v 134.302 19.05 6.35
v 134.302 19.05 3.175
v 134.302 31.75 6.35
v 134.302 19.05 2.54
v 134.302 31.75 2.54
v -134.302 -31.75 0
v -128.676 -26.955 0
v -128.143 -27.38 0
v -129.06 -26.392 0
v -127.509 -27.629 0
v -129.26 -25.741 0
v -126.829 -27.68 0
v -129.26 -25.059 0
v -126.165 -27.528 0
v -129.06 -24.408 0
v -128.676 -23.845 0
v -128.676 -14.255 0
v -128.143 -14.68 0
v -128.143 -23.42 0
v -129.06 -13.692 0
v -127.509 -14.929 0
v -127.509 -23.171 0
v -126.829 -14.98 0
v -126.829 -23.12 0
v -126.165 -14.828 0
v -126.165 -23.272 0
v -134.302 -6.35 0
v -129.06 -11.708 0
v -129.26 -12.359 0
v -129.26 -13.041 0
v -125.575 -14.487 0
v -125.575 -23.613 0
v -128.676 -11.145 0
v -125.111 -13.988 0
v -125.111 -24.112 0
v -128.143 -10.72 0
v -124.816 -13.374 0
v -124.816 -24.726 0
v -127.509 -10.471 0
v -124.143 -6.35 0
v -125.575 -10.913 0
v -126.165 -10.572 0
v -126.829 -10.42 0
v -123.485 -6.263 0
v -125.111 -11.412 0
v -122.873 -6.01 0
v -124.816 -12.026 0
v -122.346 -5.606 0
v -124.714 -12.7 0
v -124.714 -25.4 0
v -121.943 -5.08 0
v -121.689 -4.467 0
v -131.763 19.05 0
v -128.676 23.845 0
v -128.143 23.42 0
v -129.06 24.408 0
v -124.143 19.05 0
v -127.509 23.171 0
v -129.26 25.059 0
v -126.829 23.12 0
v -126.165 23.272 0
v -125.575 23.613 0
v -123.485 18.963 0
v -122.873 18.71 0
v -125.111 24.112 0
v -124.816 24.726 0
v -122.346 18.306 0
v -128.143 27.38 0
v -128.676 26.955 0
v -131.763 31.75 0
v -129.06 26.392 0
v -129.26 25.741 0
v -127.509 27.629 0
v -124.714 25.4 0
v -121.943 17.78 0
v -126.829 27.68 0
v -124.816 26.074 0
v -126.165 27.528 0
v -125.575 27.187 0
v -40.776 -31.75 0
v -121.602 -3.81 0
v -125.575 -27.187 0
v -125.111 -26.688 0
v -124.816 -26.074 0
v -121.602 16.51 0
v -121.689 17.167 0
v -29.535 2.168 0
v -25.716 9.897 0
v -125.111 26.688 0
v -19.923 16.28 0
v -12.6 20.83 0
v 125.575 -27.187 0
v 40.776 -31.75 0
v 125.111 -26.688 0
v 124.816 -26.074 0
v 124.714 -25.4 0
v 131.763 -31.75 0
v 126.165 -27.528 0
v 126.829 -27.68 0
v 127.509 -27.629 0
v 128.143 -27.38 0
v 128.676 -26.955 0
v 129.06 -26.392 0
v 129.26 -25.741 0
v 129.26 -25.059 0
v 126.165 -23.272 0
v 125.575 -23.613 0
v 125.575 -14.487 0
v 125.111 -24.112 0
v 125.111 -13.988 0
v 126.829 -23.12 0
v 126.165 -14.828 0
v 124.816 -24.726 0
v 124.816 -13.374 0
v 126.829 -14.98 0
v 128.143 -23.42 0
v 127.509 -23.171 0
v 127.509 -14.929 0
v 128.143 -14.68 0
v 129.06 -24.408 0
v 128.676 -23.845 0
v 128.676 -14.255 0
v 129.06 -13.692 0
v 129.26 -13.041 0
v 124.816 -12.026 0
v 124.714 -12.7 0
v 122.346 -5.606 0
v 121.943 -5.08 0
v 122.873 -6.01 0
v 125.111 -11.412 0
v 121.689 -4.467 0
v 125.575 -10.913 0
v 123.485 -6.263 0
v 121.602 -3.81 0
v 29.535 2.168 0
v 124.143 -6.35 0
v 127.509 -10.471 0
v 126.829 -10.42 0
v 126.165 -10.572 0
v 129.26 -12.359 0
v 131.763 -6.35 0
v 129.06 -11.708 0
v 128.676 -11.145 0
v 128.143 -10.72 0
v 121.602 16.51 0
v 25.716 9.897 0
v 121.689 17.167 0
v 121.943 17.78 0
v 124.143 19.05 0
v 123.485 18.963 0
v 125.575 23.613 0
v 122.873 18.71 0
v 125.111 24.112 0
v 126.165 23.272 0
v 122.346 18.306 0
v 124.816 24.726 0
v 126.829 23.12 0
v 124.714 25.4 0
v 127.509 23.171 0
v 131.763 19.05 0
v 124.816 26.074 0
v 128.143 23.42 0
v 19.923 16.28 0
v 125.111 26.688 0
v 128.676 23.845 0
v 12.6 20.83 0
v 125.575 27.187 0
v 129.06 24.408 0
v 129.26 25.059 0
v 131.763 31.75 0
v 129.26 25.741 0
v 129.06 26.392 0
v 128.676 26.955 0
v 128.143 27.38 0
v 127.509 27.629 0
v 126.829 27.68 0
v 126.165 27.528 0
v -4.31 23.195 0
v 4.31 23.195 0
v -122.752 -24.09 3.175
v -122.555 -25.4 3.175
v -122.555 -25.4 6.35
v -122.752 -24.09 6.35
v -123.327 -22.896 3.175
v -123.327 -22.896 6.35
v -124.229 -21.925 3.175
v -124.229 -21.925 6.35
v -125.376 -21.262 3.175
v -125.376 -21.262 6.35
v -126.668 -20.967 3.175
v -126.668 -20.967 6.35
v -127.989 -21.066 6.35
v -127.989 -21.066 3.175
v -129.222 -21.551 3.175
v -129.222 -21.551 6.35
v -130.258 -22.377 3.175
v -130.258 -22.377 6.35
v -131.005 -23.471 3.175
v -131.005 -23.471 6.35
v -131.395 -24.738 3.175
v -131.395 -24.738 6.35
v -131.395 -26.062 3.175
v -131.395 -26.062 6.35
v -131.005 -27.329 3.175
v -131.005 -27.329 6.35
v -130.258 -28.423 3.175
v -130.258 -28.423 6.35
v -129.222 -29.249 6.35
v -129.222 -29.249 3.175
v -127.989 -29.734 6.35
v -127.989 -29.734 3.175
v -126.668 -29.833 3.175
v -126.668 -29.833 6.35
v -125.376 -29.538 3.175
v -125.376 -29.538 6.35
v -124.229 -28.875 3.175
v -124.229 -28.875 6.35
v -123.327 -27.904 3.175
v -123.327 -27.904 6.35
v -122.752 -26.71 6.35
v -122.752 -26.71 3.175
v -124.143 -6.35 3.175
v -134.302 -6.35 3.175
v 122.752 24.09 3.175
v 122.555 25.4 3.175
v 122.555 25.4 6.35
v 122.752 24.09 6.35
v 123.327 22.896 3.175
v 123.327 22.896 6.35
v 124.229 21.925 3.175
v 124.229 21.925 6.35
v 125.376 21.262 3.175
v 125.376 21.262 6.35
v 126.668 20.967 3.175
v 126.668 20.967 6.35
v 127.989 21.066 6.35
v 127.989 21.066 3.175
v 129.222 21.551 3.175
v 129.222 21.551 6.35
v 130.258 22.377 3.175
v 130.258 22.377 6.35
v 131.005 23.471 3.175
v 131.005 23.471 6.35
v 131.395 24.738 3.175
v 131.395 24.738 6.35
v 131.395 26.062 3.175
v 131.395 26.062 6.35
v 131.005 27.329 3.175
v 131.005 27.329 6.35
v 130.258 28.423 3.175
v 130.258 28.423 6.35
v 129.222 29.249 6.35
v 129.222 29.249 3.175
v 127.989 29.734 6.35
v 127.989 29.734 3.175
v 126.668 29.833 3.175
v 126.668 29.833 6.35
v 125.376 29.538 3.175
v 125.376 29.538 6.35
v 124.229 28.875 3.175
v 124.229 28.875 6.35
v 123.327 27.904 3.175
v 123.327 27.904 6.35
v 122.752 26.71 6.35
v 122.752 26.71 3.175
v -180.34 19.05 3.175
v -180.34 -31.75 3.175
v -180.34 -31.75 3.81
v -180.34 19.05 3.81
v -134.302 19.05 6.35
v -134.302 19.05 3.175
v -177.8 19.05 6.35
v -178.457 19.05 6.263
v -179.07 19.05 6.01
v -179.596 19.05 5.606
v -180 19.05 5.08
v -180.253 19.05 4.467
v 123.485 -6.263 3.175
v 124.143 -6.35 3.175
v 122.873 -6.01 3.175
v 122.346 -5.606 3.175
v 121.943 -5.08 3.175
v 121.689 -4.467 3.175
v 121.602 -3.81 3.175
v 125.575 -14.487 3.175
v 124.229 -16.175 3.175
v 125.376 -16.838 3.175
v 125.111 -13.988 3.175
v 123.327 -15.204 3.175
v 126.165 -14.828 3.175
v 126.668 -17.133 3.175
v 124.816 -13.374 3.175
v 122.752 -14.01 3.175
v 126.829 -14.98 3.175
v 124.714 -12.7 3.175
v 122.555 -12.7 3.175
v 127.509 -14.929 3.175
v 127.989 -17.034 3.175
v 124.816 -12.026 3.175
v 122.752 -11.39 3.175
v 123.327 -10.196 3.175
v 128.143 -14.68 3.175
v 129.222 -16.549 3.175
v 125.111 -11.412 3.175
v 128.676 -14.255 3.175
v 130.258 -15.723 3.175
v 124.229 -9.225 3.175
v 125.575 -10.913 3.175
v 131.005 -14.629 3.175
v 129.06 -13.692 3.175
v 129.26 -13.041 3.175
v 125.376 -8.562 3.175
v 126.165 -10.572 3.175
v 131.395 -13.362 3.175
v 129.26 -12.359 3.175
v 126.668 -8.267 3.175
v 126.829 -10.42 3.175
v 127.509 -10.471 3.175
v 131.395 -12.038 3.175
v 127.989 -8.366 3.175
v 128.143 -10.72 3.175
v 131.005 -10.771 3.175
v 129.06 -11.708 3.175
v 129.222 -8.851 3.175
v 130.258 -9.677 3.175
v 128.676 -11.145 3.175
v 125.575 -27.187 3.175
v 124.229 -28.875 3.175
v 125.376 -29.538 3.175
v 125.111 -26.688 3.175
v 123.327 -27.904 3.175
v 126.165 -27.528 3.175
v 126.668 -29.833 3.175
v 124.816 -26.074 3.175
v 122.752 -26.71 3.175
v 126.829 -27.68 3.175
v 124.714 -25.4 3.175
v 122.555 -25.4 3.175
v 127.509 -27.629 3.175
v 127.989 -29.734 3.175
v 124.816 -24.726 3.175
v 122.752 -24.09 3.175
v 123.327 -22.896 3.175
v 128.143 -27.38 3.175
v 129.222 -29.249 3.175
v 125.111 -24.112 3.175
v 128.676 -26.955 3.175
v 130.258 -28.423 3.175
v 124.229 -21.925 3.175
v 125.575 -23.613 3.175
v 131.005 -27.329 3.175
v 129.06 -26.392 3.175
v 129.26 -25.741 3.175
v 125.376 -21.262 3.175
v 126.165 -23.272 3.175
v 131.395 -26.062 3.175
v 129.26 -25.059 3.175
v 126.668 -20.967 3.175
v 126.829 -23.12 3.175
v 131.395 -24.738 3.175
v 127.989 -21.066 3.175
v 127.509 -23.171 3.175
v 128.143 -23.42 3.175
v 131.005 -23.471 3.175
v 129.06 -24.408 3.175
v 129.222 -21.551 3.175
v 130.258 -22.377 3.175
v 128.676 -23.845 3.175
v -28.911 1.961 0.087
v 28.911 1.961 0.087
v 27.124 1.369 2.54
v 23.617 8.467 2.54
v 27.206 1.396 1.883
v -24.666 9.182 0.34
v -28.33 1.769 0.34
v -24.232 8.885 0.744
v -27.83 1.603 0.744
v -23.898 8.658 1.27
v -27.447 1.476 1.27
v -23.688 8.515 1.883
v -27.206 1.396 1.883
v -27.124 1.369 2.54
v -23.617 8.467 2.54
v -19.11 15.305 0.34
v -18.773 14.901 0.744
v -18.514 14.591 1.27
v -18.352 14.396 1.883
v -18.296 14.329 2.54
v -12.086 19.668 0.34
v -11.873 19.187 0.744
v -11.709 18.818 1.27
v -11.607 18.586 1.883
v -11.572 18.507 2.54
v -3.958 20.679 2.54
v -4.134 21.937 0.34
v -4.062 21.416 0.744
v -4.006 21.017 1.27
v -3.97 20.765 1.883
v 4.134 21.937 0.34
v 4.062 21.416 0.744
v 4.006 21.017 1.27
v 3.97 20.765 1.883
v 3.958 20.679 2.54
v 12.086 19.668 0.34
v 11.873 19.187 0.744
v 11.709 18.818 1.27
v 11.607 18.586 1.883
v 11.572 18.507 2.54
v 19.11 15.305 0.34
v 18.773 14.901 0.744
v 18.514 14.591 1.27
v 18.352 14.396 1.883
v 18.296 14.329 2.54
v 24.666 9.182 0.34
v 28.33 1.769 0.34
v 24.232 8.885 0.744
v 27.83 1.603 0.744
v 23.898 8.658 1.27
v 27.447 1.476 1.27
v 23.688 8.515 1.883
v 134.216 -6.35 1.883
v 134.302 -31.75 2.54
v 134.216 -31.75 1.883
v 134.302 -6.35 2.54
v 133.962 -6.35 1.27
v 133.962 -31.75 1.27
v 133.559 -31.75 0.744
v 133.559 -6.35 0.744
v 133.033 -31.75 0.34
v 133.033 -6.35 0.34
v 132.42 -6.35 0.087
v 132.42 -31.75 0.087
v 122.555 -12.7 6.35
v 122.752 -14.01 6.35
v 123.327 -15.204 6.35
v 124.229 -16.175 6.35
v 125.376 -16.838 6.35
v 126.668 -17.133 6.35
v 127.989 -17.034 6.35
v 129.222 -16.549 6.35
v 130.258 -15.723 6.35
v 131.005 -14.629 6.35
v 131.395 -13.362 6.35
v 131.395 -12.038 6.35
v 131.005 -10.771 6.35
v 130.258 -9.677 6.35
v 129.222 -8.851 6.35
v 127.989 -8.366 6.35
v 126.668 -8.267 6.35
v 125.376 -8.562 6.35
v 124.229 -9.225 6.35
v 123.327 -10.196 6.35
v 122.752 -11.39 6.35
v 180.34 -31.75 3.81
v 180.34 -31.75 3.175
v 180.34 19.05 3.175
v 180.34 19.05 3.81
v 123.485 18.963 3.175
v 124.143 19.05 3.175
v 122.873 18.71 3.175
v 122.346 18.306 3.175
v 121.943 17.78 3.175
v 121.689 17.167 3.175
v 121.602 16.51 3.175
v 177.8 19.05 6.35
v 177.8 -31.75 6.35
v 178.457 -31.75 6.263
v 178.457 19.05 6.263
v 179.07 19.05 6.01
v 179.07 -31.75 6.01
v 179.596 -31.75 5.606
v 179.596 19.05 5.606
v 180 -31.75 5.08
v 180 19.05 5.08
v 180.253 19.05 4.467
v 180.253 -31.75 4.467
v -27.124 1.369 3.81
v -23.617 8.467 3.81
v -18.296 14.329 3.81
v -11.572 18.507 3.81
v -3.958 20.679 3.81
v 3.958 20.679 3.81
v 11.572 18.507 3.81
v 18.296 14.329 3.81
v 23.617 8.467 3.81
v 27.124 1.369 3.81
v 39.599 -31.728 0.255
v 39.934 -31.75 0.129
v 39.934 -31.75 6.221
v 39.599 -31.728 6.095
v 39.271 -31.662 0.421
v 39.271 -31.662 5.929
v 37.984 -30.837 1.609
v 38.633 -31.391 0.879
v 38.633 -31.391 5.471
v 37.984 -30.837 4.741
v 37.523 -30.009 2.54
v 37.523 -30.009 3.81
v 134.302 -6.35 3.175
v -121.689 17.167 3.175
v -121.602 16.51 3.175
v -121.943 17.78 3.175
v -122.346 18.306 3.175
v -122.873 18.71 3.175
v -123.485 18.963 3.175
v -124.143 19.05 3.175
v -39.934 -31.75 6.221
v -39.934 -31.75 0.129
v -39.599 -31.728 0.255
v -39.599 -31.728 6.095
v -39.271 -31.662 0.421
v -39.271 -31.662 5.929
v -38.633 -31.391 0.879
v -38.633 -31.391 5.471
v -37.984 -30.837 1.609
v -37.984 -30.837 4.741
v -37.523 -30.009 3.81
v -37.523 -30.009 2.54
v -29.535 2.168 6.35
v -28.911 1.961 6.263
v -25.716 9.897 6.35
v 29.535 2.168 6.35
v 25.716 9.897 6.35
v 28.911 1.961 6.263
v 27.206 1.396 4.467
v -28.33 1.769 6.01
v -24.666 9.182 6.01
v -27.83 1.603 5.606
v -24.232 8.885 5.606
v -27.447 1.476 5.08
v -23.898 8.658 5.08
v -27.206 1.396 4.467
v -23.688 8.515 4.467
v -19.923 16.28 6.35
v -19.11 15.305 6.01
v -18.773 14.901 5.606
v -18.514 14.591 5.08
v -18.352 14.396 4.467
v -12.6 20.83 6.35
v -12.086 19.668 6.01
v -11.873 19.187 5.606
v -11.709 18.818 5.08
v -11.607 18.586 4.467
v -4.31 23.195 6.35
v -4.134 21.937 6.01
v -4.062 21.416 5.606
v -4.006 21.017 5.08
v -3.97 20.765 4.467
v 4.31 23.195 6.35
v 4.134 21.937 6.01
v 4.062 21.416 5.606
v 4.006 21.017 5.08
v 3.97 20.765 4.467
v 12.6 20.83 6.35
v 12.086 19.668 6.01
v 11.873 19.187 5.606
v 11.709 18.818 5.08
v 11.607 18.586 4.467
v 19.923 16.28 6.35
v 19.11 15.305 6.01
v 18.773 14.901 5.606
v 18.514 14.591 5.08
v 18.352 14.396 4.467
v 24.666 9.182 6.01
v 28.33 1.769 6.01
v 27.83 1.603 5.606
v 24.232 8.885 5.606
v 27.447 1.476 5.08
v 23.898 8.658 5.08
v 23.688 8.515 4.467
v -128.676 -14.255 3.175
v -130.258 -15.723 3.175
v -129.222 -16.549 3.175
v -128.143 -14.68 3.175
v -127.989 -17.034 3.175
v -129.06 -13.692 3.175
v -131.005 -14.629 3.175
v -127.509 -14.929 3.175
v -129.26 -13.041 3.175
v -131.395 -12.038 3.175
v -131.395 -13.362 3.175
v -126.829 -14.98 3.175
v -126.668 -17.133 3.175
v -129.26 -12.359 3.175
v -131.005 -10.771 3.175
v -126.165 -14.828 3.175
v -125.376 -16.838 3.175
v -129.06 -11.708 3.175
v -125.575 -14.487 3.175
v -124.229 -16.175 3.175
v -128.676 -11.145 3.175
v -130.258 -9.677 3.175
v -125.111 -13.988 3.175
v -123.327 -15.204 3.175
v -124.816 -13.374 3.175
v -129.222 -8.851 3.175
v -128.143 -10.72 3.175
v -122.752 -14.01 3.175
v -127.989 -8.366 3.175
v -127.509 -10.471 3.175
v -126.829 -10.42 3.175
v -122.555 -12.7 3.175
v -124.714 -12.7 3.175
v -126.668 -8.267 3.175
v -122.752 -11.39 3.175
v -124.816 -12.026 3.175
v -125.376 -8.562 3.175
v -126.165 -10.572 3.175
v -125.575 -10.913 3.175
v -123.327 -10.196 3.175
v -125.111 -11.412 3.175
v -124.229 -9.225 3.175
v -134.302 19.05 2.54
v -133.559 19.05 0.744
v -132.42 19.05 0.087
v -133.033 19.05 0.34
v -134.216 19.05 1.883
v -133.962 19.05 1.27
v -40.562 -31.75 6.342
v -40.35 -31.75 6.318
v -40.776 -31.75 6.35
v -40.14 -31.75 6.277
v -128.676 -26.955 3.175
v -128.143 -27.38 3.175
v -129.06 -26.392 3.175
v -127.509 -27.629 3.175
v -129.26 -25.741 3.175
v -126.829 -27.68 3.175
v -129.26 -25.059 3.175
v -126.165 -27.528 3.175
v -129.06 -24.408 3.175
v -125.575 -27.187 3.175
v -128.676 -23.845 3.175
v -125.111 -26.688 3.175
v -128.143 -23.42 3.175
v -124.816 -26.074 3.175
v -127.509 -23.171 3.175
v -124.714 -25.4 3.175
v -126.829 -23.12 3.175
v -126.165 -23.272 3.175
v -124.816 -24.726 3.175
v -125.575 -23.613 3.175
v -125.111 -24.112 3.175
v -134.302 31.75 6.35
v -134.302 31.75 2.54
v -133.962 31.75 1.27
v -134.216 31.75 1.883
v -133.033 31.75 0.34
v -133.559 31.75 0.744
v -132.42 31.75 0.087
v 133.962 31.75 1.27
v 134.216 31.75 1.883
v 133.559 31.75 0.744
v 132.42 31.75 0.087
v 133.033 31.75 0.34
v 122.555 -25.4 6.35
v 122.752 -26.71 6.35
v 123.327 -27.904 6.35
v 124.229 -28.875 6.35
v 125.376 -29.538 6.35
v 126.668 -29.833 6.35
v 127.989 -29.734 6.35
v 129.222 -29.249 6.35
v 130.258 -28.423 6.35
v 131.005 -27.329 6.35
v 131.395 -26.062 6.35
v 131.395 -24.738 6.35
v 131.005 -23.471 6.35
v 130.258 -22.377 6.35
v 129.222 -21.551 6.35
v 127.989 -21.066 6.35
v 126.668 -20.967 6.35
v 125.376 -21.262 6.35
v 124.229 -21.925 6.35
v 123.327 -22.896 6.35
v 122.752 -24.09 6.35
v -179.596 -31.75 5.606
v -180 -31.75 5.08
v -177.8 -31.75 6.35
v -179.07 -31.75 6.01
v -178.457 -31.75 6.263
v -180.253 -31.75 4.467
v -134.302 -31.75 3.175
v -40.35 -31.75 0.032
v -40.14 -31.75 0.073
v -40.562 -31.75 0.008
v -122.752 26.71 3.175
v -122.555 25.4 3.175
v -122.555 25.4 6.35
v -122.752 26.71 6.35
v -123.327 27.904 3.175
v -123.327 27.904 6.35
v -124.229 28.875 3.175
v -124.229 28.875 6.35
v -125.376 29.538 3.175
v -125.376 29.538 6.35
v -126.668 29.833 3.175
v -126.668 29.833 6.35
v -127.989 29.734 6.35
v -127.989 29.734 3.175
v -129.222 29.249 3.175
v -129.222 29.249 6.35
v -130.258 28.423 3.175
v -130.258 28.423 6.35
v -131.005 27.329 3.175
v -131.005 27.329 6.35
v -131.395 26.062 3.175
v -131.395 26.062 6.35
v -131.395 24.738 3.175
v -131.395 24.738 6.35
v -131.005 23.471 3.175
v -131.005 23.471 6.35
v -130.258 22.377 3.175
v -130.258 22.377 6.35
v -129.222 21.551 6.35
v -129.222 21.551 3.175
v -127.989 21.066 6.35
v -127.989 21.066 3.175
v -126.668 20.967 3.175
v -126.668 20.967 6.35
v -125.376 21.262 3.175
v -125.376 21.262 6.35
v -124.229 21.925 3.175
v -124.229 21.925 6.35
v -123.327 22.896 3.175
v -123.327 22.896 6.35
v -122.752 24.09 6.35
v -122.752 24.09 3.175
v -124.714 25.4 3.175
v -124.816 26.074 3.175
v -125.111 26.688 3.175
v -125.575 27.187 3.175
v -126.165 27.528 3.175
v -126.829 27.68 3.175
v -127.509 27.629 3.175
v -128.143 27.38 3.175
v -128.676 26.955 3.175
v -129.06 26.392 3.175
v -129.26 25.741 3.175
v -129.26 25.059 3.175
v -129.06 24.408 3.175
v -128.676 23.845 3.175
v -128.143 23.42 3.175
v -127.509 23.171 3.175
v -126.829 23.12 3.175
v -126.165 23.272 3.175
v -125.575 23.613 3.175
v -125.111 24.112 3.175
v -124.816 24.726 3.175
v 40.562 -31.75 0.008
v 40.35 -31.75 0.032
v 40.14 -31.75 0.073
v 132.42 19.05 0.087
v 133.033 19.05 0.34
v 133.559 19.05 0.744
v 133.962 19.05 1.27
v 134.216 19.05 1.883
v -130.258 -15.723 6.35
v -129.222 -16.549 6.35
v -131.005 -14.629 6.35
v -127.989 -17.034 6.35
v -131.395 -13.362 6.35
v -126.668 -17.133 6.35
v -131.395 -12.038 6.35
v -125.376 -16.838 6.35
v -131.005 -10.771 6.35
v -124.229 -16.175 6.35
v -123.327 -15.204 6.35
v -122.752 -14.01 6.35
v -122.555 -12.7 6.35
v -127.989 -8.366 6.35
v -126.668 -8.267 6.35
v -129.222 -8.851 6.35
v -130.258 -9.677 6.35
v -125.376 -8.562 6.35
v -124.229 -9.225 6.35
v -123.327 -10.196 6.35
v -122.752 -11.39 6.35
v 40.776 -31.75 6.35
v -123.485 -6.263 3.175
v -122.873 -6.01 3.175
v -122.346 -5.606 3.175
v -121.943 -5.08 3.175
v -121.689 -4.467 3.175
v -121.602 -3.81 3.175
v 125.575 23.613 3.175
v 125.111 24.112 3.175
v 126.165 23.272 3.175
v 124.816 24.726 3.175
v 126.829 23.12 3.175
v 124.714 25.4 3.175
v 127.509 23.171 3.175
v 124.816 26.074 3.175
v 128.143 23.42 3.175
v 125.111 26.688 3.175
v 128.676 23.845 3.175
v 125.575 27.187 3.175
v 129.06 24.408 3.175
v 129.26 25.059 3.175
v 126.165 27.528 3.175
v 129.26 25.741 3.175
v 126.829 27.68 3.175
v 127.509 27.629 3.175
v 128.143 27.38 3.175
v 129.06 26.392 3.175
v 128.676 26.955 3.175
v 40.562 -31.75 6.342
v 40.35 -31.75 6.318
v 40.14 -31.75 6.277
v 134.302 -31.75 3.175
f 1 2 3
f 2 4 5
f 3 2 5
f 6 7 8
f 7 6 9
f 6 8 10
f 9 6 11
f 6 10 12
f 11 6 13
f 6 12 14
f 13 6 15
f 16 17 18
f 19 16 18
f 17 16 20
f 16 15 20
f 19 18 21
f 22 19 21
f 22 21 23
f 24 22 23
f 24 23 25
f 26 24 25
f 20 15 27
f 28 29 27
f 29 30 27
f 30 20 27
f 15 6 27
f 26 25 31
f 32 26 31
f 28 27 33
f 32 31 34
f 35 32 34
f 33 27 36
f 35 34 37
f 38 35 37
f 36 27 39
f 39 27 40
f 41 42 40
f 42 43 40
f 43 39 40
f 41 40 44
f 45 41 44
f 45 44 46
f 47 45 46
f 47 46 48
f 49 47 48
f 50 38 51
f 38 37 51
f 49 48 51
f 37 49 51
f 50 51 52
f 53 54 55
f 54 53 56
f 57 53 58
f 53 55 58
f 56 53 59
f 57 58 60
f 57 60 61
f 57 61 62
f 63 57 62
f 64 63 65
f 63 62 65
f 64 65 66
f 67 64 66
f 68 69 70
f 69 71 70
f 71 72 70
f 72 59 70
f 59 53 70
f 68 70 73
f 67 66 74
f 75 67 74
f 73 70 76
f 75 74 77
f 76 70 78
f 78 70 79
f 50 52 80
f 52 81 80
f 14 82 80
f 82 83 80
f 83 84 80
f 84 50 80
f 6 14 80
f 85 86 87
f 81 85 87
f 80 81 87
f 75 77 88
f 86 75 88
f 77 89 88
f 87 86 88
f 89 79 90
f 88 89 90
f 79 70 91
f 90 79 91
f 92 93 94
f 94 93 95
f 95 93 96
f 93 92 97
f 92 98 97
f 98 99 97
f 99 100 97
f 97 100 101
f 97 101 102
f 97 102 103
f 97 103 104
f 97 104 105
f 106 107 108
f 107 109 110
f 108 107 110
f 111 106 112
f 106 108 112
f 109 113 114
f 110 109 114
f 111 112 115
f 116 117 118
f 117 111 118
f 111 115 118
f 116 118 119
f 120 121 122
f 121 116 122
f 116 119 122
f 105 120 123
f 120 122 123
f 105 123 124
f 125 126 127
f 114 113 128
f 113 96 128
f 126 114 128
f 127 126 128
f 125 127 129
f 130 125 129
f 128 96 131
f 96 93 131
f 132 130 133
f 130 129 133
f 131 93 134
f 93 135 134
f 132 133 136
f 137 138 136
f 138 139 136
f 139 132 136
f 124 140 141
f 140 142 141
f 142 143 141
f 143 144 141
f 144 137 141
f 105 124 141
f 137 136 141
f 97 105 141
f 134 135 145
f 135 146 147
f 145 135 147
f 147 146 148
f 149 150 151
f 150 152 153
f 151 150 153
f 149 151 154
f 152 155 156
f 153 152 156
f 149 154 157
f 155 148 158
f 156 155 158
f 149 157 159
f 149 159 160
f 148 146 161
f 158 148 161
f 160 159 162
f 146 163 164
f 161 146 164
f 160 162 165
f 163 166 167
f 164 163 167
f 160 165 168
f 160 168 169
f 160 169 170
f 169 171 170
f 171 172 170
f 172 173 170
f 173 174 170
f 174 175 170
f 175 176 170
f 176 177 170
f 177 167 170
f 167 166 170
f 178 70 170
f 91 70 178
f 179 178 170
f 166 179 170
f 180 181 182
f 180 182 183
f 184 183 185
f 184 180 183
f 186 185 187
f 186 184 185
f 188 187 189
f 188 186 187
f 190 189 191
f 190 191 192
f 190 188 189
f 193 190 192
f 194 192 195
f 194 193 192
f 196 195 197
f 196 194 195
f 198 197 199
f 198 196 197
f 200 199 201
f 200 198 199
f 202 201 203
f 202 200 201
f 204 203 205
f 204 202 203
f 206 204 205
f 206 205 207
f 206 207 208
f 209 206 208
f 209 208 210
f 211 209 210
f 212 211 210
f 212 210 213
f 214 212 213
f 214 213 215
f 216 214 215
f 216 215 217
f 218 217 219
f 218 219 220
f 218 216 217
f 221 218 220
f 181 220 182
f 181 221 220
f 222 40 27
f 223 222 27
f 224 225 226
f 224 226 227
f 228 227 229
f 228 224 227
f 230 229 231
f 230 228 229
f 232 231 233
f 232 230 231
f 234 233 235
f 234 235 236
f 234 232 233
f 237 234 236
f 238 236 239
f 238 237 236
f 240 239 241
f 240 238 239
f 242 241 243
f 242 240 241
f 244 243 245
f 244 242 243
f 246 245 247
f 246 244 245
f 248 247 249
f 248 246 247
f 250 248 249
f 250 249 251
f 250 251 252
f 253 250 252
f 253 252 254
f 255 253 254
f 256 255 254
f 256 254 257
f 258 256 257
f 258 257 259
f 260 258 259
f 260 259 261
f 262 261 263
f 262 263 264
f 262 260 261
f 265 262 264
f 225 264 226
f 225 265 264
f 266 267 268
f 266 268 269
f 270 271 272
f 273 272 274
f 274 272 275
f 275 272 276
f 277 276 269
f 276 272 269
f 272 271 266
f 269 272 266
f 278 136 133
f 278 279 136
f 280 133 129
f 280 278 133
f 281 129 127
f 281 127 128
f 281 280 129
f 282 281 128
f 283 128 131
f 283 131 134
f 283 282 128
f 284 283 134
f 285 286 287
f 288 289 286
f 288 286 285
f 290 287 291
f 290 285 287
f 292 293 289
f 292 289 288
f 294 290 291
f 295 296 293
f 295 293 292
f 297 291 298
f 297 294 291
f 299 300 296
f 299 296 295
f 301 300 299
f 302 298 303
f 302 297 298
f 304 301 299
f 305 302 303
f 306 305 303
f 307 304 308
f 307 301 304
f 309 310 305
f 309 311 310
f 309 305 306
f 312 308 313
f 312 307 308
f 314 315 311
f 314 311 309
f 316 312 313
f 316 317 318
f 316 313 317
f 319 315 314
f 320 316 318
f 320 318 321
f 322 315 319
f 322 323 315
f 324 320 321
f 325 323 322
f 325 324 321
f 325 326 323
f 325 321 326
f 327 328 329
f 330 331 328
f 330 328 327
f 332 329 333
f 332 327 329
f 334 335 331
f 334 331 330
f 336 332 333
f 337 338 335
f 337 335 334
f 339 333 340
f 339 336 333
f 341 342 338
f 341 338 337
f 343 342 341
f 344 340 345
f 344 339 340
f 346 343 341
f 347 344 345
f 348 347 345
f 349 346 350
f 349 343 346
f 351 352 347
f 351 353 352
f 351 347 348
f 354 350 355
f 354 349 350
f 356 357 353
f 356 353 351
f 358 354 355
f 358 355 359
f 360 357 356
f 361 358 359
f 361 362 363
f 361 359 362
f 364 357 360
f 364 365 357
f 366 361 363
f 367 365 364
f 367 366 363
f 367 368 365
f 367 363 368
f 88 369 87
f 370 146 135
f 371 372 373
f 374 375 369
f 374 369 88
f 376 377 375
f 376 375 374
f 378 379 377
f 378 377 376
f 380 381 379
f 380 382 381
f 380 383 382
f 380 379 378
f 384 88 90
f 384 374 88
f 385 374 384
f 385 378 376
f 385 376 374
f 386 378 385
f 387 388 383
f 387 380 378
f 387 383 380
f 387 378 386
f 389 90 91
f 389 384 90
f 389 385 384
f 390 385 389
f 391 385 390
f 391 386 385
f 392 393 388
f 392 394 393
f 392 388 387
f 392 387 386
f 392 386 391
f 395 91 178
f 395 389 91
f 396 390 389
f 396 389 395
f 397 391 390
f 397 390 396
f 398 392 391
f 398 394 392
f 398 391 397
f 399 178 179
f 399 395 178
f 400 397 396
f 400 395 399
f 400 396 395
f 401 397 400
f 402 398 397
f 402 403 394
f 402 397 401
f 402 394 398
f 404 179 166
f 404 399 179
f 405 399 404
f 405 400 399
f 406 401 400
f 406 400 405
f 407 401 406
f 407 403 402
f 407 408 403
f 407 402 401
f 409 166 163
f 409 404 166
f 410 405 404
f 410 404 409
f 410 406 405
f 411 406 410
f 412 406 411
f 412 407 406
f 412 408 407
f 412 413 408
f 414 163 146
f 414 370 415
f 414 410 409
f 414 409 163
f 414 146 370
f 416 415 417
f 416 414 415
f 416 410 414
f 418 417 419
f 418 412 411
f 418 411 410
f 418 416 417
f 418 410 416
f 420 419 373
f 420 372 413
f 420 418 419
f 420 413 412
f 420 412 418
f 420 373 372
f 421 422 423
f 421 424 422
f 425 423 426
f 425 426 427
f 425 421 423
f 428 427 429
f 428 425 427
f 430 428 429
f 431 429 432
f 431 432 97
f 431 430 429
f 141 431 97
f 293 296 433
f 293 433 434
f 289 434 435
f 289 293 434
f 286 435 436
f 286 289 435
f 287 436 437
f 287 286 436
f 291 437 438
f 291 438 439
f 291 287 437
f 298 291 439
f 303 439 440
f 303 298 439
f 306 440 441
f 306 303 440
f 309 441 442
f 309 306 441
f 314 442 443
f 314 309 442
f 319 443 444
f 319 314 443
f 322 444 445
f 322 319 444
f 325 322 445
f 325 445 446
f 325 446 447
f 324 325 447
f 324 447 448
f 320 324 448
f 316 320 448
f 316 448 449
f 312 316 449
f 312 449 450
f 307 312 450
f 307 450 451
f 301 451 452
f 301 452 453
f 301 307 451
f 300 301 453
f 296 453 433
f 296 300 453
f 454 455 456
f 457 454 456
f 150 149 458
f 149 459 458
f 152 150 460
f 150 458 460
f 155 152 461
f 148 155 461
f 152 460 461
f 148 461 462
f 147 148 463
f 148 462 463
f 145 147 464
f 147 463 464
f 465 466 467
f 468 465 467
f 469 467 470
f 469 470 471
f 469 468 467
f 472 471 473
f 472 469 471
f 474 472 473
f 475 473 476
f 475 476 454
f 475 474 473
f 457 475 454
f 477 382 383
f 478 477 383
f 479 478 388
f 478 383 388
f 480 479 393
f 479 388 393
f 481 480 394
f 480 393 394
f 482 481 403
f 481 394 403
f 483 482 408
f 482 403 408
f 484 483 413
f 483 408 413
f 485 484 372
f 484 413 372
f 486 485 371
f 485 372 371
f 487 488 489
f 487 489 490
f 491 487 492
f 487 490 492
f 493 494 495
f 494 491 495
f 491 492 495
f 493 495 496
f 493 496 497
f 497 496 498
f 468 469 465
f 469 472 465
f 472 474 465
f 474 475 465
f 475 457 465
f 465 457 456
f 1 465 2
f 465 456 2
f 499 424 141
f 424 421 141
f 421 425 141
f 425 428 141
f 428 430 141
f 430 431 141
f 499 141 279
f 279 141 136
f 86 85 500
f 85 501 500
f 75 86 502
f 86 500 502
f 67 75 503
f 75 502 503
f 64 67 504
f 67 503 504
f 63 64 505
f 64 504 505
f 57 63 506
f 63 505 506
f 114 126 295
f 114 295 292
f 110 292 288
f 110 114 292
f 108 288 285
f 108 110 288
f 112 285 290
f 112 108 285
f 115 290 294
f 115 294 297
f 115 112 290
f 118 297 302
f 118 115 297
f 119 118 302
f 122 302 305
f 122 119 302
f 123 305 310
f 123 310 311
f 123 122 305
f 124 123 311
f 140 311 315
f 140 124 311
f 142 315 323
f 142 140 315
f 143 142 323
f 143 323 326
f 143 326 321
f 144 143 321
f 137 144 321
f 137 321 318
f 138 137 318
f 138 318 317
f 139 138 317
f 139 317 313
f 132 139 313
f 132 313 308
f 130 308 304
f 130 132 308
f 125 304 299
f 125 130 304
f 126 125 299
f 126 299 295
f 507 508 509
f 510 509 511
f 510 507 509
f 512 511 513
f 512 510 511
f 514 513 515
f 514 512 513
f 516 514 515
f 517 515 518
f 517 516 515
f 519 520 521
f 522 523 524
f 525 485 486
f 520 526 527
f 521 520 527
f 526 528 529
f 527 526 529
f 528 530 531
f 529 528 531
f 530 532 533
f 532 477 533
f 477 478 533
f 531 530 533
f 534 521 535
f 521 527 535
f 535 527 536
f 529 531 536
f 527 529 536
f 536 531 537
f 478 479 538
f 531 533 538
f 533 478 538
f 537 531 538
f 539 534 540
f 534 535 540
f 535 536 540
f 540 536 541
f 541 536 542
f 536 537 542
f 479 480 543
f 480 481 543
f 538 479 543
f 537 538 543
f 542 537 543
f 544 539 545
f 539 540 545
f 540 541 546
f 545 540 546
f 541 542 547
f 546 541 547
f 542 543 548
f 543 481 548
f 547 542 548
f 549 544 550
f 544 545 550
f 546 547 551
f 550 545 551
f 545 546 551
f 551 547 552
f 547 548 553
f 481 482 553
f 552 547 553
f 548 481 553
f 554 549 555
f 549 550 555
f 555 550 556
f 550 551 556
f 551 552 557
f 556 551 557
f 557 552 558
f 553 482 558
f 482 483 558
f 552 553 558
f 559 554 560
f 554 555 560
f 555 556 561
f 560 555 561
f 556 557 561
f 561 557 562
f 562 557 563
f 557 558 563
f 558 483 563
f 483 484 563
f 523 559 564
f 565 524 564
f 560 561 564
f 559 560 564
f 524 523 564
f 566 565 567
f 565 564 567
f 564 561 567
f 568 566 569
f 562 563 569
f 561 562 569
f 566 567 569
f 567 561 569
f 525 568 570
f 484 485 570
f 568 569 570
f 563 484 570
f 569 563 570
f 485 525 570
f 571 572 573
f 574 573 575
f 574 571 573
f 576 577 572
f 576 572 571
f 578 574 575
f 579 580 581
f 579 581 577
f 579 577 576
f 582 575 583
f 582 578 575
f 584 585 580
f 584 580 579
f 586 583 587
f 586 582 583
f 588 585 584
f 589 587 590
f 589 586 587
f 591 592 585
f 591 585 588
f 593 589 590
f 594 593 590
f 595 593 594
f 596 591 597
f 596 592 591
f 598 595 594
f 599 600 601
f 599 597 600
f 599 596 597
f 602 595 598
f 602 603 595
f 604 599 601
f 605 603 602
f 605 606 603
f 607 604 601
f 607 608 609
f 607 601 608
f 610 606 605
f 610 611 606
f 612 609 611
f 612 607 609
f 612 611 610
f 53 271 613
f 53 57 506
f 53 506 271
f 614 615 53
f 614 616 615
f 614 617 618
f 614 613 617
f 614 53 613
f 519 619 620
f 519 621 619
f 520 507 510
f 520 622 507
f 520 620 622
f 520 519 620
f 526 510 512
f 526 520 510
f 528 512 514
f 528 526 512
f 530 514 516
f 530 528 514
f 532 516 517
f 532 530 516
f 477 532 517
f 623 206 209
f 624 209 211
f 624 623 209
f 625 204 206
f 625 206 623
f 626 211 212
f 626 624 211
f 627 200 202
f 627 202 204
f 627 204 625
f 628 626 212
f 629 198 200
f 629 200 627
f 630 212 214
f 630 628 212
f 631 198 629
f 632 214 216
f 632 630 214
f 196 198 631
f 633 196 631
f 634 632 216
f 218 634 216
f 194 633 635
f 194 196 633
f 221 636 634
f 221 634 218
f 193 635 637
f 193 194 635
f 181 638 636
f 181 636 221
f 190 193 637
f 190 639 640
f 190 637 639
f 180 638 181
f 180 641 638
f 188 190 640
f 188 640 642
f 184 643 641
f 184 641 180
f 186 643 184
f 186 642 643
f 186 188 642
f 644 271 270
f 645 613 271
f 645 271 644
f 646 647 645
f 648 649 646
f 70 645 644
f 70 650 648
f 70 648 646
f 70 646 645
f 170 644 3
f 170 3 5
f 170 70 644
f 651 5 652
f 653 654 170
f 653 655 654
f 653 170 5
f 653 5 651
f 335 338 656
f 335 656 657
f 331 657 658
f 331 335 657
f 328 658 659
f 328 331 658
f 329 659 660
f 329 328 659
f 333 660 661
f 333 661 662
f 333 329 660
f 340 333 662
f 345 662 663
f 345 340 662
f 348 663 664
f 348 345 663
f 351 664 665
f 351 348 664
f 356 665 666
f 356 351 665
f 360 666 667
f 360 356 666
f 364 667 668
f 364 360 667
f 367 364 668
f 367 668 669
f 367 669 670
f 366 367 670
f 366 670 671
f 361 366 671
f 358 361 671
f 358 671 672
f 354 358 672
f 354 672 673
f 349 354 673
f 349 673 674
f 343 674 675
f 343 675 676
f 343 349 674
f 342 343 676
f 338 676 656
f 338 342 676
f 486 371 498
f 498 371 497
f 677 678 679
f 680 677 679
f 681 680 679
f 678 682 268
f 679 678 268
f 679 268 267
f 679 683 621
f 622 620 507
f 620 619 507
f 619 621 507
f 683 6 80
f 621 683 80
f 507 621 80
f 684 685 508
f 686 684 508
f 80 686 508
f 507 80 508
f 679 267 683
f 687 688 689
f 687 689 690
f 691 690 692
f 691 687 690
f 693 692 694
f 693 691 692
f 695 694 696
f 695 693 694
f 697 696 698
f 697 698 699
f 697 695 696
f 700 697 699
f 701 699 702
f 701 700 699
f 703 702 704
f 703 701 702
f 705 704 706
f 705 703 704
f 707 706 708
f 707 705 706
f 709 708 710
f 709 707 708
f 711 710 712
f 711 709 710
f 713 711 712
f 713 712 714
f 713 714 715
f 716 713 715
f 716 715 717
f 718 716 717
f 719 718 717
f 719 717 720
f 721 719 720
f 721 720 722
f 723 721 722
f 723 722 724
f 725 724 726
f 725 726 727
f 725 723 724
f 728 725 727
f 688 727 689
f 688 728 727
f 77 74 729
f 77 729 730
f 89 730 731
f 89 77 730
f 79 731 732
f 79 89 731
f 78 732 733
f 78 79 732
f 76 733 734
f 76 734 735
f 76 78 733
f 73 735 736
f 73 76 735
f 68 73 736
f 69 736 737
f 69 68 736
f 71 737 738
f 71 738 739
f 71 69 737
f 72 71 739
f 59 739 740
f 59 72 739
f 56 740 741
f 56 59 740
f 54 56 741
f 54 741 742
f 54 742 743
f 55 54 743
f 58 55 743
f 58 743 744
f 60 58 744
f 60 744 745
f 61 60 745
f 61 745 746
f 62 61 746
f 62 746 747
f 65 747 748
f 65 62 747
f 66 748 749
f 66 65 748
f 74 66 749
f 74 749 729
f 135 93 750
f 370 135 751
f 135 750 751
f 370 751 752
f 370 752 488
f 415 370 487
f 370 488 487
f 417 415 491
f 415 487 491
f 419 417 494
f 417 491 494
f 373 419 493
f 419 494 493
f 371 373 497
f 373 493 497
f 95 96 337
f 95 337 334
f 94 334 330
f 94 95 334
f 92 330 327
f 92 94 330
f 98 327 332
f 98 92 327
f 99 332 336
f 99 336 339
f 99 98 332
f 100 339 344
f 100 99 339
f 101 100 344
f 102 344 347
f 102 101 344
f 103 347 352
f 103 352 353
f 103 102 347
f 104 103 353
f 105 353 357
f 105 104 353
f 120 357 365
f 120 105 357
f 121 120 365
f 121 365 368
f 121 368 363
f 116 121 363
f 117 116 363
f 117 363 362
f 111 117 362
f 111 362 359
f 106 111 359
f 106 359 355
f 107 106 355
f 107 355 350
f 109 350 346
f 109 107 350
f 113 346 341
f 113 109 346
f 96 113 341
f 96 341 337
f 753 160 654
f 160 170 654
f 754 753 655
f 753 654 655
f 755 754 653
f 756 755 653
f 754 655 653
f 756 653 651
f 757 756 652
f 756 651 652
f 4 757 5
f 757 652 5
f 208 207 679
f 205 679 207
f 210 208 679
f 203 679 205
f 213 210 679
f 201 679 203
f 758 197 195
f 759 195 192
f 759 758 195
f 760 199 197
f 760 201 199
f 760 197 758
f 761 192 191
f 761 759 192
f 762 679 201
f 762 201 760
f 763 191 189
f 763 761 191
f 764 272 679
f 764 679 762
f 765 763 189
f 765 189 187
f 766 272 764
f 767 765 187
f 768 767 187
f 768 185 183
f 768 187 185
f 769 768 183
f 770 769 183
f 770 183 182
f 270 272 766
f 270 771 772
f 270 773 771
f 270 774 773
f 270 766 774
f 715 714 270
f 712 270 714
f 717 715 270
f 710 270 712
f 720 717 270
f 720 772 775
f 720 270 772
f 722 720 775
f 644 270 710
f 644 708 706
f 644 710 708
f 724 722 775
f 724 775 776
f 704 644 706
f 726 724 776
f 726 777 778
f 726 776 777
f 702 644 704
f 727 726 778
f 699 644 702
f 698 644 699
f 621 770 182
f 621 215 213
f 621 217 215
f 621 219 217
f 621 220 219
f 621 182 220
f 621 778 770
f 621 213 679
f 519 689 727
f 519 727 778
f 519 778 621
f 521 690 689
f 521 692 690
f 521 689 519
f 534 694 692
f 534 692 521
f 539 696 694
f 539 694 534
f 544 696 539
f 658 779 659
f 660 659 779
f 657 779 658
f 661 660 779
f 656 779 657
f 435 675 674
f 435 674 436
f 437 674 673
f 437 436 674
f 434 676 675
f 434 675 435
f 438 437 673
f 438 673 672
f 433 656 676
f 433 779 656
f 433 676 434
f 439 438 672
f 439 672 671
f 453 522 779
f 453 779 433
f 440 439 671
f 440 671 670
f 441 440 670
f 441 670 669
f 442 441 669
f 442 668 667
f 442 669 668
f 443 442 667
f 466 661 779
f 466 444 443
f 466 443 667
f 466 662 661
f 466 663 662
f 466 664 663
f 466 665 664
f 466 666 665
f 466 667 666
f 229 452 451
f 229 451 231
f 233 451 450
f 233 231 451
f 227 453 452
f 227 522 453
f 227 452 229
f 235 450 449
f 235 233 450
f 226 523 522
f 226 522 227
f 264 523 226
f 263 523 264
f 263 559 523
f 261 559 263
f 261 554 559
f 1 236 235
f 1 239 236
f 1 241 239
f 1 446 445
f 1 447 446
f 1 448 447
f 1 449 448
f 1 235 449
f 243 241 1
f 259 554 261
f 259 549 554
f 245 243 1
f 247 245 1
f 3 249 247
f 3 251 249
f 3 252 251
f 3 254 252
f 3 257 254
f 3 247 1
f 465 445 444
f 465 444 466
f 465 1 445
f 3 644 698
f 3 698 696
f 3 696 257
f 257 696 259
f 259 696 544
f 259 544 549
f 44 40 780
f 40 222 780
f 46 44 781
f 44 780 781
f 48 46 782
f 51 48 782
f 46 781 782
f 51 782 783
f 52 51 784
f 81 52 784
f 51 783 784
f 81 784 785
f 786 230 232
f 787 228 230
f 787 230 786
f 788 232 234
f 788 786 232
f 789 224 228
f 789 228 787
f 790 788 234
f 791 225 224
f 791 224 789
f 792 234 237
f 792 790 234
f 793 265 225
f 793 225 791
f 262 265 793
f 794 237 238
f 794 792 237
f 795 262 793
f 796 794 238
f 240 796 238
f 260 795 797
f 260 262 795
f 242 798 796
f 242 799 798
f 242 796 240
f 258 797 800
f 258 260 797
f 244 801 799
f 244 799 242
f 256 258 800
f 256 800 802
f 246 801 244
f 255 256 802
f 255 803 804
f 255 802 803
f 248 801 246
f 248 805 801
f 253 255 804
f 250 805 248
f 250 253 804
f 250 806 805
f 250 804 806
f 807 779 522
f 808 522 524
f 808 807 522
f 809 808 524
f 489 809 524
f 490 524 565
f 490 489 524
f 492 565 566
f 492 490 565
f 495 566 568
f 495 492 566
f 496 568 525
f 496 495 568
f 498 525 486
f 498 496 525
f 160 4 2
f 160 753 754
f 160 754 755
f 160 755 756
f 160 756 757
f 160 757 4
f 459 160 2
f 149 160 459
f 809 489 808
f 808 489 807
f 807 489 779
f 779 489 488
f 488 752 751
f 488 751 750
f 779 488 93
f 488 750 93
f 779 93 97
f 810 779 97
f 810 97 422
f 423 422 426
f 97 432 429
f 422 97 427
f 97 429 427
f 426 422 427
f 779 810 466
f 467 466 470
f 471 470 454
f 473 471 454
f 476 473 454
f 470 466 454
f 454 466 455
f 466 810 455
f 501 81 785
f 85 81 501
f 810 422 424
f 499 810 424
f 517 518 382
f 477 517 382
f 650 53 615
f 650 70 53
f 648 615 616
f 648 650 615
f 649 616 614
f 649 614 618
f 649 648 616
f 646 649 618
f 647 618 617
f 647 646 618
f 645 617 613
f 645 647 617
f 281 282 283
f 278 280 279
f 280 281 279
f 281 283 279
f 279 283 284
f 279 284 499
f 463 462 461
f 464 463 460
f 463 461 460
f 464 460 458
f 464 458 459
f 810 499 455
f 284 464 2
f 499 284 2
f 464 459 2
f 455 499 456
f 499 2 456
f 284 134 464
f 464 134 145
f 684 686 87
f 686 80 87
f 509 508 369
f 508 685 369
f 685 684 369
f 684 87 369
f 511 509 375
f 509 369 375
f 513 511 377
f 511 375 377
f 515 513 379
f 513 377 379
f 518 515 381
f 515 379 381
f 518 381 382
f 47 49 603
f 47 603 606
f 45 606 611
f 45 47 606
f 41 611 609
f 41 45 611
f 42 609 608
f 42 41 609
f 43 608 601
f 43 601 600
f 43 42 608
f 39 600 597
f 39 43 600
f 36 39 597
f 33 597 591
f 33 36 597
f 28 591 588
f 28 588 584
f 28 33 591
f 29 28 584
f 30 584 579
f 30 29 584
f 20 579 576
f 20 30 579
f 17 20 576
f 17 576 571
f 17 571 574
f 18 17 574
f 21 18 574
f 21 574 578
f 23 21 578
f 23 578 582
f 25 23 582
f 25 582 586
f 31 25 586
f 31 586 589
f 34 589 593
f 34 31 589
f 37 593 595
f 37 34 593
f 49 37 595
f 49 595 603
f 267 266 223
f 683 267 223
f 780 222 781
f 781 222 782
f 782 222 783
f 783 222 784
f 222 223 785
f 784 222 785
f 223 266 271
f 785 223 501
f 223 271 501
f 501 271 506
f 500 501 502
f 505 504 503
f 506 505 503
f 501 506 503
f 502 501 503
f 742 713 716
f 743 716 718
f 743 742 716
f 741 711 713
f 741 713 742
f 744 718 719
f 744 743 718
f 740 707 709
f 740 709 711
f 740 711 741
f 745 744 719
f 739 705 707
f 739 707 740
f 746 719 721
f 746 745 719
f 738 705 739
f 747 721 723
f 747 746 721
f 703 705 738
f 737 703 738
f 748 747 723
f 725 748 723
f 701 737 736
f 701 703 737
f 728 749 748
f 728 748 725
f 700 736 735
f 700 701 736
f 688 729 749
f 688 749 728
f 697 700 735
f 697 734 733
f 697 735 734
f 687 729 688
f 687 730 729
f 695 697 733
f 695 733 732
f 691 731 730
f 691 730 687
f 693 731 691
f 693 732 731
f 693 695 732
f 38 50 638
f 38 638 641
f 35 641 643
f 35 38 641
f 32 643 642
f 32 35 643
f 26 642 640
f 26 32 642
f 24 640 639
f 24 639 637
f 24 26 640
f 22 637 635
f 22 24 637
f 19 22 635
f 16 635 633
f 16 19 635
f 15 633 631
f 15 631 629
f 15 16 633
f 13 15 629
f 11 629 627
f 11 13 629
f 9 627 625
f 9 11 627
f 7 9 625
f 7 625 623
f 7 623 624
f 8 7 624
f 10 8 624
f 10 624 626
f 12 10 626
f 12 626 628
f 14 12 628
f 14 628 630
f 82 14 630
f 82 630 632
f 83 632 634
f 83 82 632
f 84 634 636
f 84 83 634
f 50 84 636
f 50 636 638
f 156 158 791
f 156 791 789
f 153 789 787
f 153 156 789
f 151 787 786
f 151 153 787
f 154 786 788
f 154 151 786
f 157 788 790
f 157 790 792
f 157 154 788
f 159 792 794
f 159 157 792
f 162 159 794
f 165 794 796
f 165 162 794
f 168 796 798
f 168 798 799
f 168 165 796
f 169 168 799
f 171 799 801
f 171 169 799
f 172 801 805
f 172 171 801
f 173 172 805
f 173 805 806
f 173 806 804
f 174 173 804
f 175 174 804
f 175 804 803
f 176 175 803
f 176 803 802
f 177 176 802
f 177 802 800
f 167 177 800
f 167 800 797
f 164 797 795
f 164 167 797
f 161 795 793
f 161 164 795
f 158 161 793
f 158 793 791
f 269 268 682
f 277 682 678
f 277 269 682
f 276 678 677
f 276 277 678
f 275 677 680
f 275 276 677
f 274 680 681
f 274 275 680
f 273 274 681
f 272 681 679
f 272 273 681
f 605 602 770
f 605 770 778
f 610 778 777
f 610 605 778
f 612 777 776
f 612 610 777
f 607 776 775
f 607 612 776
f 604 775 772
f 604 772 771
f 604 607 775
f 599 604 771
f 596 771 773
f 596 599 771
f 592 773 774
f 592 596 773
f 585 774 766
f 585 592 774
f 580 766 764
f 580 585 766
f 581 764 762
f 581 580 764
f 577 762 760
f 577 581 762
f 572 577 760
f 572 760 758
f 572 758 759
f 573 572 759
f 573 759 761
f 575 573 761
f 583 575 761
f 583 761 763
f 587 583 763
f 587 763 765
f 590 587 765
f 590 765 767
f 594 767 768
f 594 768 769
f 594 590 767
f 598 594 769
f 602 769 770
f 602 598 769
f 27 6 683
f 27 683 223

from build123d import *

# Parameters (mm, degrees)
SKETCH1_W           = 268.605
SKETCH1_H           = 63.5
SKETCH1_R           = 2.286
BOSS_EXTRUDE1_DEPTH = 3.175
SKETCH2_W           = 360.68
SKETCH2_H           = 63.5
SKETCH2_R           = 4.445
BOSS_EXTRUDE2_DEPTH = 3.175
SKETCH3_W           = 12.7
SKETCH3_H           = 25.4
CUT_EXTRUDE1_DEPTH  = 3.175
FILLET1_R           = 2.54
CUT_EXTRUDE2_DEPTH  = 184.223635484
FILLET2_R           = 2.54
SKETCH6_W           = 46.0375
SKETCH6_H           = 12.7
CUT_EXTRUDE3_DEPTH  = 184.141089669


with BuildPart() as part:
    # Sketch1 → Boss-Extrude1 (new body)
    with BuildSketch(Plane.XY):
        Rectangle(SKETCH1_W, SKETCH1_H)
        with Locations((-127, 25.4)):
            Circle(SKETCH1_R, mode=Mode.SUBTRACT)
        with Locations((-127, -12.7)):
            Circle(SKETCH1_R, mode=Mode.SUBTRACT)
        with Locations((-127, -25.4)):
            Circle(SKETCH1_R, mode=Mode.SUBTRACT)
        with Locations(Location((127, 25.4, 0), (0, 0, 180))):
            Circle(SKETCH1_R, mode=Mode.SUBTRACT)
        with Locations(Location((127, -12.7, 0), (0, 0, 180))):
            Circle(SKETCH1_R, mode=Mode.SUBTRACT)
        with Locations(Location((127, -25.4, 0), (0, 0, 180))):
            Circle(SKETCH1_R, mode=Mode.SUBTRACT)
    extrude(amount=BOSS_EXTRUDE1_DEPTH)

    # Sketch2 → Boss-Extrude2 (add)
    with BuildSketch(Plane.XY.offset(3.175)):
        Rectangle(SKETCH2_W, SKETCH2_H)
        with Locations((-127, 25.4)):
            Circle(SKETCH2_R, mode=Mode.SUBTRACT)
        with Locations((-127, -12.7)):
            Circle(SKETCH2_R, mode=Mode.SUBTRACT)
        with Locations((-127, -25.4)):
            Circle(SKETCH2_R, mode=Mode.SUBTRACT)
        with Locations(Location((127, 25.4, 0), (0, 0, 180))):
            Circle(SKETCH2_R, mode=Mode.SUBTRACT)
        with Locations(Location((127, -12.7, 0), (0, 0, 180))):
            Circle(SKETCH2_R, mode=Mode.SUBTRACT)
        with Locations(Location((127, -25.4, 0), (0, 0, 180))):
            Circle(SKETCH2_R, mode=Mode.SUBTRACT)
    extrude(amount=BOSS_EXTRUDE2_DEPTH)

    # Sketch3 → Cut-Extrude1 (cut)
    with BuildSketch(Plane(origin=(0, 0, 0), x_dir=(-1, 0, 0), z_dir=(0, 0, -1))):
        with Locations((-127.9525, 6.35)):
            Rectangle(SKETCH3_W, SKETCH3_H)
        with Locations((127.9525, 6.35)):
            Rectangle(SKETCH3_W, SKETCH3_H)
    extrude(amount=-CUT_EXTRUDE1_DEPTH, mode=Mode.SUBTRACT)

    # Fillet1
    fillet1_edges = [part.edges().sort_by_distance(p)[0] for p in [
        (180.34, 0, 6.35),
        (-180.34, 0, 6.35),
        (-134.3025, 25.4, 0),
        (134.3025, -19.05, 0),
        (134.3025, 25.4, 0),
        (121.6025, 19.05, 1.5875),
        (121.6025, -6.35, 1.5875),
        (-121.6025, 19.05, 1.5875),
        (-121.6025, -6.35, 1.5875),
    ]]
    fillet(fillet1_edges, radius=FILLET1_R)

    # Sketch5 → Cut-Extrude2 (cut, through all)
    with BuildSketch(Plane(origin=(0, 0, 0), x_dir=(-1, 0, 0), z_dir=(0, 0, -1))):
        with BuildLine():
            Line((-27.124304603, 1.369033584), (-38.1, -31.75))
            Line((-38.1, -31.75), (38.1, -31.75))
            Line((38.1, -31.75), (27.124304603, 1.369033584))
            ThreePointArc((27.124304603, 1.369033584), (0, 20.955), (-27.124304603, 1.369033584))
        make_face()
    extrude(amount=-CUT_EXTRUDE2_DEPTH, mode=Mode.SUBTRACT)

    # Fillet2
    fillet2_edges = [part.edges().sort_by_distance(p)[0] for p in [
        (0, 20.955, 6.35),
        (-32.612152302, -15.190483208, 6.35),
        (-38.1, -31.75, 3.175),
        (32.612152302, -15.190483208, 6.35),
        (38.1, -31.75, 3.175),
        (0, 20.955, 0),
        (32.612152302, -15.190483208, 0),
        (-32.612152302, -15.190483208, 0),
    ]]
    fillet(fillet2_edges, radius=FILLET2_R)

    # Sketch6 → Cut-Extrude3 (cut, through all)
    with BuildSketch(Plane(origin=(0, 0, 3.175), x_dir=(-1, 0, 0), z_dir=(0, 0, -1))):
        with Locations((-157.32125, 25.4)):
            Rectangle(SKETCH6_W, SKETCH6_H)
        with Locations((157.32125, 25.4)):
            Rectangle(SKETCH6_W, SKETCH6_H)
    extrude(amount=-CUT_EXTRUDE3_DEPTH, mode=Mode.SUBTRACT)


solid = part.part
